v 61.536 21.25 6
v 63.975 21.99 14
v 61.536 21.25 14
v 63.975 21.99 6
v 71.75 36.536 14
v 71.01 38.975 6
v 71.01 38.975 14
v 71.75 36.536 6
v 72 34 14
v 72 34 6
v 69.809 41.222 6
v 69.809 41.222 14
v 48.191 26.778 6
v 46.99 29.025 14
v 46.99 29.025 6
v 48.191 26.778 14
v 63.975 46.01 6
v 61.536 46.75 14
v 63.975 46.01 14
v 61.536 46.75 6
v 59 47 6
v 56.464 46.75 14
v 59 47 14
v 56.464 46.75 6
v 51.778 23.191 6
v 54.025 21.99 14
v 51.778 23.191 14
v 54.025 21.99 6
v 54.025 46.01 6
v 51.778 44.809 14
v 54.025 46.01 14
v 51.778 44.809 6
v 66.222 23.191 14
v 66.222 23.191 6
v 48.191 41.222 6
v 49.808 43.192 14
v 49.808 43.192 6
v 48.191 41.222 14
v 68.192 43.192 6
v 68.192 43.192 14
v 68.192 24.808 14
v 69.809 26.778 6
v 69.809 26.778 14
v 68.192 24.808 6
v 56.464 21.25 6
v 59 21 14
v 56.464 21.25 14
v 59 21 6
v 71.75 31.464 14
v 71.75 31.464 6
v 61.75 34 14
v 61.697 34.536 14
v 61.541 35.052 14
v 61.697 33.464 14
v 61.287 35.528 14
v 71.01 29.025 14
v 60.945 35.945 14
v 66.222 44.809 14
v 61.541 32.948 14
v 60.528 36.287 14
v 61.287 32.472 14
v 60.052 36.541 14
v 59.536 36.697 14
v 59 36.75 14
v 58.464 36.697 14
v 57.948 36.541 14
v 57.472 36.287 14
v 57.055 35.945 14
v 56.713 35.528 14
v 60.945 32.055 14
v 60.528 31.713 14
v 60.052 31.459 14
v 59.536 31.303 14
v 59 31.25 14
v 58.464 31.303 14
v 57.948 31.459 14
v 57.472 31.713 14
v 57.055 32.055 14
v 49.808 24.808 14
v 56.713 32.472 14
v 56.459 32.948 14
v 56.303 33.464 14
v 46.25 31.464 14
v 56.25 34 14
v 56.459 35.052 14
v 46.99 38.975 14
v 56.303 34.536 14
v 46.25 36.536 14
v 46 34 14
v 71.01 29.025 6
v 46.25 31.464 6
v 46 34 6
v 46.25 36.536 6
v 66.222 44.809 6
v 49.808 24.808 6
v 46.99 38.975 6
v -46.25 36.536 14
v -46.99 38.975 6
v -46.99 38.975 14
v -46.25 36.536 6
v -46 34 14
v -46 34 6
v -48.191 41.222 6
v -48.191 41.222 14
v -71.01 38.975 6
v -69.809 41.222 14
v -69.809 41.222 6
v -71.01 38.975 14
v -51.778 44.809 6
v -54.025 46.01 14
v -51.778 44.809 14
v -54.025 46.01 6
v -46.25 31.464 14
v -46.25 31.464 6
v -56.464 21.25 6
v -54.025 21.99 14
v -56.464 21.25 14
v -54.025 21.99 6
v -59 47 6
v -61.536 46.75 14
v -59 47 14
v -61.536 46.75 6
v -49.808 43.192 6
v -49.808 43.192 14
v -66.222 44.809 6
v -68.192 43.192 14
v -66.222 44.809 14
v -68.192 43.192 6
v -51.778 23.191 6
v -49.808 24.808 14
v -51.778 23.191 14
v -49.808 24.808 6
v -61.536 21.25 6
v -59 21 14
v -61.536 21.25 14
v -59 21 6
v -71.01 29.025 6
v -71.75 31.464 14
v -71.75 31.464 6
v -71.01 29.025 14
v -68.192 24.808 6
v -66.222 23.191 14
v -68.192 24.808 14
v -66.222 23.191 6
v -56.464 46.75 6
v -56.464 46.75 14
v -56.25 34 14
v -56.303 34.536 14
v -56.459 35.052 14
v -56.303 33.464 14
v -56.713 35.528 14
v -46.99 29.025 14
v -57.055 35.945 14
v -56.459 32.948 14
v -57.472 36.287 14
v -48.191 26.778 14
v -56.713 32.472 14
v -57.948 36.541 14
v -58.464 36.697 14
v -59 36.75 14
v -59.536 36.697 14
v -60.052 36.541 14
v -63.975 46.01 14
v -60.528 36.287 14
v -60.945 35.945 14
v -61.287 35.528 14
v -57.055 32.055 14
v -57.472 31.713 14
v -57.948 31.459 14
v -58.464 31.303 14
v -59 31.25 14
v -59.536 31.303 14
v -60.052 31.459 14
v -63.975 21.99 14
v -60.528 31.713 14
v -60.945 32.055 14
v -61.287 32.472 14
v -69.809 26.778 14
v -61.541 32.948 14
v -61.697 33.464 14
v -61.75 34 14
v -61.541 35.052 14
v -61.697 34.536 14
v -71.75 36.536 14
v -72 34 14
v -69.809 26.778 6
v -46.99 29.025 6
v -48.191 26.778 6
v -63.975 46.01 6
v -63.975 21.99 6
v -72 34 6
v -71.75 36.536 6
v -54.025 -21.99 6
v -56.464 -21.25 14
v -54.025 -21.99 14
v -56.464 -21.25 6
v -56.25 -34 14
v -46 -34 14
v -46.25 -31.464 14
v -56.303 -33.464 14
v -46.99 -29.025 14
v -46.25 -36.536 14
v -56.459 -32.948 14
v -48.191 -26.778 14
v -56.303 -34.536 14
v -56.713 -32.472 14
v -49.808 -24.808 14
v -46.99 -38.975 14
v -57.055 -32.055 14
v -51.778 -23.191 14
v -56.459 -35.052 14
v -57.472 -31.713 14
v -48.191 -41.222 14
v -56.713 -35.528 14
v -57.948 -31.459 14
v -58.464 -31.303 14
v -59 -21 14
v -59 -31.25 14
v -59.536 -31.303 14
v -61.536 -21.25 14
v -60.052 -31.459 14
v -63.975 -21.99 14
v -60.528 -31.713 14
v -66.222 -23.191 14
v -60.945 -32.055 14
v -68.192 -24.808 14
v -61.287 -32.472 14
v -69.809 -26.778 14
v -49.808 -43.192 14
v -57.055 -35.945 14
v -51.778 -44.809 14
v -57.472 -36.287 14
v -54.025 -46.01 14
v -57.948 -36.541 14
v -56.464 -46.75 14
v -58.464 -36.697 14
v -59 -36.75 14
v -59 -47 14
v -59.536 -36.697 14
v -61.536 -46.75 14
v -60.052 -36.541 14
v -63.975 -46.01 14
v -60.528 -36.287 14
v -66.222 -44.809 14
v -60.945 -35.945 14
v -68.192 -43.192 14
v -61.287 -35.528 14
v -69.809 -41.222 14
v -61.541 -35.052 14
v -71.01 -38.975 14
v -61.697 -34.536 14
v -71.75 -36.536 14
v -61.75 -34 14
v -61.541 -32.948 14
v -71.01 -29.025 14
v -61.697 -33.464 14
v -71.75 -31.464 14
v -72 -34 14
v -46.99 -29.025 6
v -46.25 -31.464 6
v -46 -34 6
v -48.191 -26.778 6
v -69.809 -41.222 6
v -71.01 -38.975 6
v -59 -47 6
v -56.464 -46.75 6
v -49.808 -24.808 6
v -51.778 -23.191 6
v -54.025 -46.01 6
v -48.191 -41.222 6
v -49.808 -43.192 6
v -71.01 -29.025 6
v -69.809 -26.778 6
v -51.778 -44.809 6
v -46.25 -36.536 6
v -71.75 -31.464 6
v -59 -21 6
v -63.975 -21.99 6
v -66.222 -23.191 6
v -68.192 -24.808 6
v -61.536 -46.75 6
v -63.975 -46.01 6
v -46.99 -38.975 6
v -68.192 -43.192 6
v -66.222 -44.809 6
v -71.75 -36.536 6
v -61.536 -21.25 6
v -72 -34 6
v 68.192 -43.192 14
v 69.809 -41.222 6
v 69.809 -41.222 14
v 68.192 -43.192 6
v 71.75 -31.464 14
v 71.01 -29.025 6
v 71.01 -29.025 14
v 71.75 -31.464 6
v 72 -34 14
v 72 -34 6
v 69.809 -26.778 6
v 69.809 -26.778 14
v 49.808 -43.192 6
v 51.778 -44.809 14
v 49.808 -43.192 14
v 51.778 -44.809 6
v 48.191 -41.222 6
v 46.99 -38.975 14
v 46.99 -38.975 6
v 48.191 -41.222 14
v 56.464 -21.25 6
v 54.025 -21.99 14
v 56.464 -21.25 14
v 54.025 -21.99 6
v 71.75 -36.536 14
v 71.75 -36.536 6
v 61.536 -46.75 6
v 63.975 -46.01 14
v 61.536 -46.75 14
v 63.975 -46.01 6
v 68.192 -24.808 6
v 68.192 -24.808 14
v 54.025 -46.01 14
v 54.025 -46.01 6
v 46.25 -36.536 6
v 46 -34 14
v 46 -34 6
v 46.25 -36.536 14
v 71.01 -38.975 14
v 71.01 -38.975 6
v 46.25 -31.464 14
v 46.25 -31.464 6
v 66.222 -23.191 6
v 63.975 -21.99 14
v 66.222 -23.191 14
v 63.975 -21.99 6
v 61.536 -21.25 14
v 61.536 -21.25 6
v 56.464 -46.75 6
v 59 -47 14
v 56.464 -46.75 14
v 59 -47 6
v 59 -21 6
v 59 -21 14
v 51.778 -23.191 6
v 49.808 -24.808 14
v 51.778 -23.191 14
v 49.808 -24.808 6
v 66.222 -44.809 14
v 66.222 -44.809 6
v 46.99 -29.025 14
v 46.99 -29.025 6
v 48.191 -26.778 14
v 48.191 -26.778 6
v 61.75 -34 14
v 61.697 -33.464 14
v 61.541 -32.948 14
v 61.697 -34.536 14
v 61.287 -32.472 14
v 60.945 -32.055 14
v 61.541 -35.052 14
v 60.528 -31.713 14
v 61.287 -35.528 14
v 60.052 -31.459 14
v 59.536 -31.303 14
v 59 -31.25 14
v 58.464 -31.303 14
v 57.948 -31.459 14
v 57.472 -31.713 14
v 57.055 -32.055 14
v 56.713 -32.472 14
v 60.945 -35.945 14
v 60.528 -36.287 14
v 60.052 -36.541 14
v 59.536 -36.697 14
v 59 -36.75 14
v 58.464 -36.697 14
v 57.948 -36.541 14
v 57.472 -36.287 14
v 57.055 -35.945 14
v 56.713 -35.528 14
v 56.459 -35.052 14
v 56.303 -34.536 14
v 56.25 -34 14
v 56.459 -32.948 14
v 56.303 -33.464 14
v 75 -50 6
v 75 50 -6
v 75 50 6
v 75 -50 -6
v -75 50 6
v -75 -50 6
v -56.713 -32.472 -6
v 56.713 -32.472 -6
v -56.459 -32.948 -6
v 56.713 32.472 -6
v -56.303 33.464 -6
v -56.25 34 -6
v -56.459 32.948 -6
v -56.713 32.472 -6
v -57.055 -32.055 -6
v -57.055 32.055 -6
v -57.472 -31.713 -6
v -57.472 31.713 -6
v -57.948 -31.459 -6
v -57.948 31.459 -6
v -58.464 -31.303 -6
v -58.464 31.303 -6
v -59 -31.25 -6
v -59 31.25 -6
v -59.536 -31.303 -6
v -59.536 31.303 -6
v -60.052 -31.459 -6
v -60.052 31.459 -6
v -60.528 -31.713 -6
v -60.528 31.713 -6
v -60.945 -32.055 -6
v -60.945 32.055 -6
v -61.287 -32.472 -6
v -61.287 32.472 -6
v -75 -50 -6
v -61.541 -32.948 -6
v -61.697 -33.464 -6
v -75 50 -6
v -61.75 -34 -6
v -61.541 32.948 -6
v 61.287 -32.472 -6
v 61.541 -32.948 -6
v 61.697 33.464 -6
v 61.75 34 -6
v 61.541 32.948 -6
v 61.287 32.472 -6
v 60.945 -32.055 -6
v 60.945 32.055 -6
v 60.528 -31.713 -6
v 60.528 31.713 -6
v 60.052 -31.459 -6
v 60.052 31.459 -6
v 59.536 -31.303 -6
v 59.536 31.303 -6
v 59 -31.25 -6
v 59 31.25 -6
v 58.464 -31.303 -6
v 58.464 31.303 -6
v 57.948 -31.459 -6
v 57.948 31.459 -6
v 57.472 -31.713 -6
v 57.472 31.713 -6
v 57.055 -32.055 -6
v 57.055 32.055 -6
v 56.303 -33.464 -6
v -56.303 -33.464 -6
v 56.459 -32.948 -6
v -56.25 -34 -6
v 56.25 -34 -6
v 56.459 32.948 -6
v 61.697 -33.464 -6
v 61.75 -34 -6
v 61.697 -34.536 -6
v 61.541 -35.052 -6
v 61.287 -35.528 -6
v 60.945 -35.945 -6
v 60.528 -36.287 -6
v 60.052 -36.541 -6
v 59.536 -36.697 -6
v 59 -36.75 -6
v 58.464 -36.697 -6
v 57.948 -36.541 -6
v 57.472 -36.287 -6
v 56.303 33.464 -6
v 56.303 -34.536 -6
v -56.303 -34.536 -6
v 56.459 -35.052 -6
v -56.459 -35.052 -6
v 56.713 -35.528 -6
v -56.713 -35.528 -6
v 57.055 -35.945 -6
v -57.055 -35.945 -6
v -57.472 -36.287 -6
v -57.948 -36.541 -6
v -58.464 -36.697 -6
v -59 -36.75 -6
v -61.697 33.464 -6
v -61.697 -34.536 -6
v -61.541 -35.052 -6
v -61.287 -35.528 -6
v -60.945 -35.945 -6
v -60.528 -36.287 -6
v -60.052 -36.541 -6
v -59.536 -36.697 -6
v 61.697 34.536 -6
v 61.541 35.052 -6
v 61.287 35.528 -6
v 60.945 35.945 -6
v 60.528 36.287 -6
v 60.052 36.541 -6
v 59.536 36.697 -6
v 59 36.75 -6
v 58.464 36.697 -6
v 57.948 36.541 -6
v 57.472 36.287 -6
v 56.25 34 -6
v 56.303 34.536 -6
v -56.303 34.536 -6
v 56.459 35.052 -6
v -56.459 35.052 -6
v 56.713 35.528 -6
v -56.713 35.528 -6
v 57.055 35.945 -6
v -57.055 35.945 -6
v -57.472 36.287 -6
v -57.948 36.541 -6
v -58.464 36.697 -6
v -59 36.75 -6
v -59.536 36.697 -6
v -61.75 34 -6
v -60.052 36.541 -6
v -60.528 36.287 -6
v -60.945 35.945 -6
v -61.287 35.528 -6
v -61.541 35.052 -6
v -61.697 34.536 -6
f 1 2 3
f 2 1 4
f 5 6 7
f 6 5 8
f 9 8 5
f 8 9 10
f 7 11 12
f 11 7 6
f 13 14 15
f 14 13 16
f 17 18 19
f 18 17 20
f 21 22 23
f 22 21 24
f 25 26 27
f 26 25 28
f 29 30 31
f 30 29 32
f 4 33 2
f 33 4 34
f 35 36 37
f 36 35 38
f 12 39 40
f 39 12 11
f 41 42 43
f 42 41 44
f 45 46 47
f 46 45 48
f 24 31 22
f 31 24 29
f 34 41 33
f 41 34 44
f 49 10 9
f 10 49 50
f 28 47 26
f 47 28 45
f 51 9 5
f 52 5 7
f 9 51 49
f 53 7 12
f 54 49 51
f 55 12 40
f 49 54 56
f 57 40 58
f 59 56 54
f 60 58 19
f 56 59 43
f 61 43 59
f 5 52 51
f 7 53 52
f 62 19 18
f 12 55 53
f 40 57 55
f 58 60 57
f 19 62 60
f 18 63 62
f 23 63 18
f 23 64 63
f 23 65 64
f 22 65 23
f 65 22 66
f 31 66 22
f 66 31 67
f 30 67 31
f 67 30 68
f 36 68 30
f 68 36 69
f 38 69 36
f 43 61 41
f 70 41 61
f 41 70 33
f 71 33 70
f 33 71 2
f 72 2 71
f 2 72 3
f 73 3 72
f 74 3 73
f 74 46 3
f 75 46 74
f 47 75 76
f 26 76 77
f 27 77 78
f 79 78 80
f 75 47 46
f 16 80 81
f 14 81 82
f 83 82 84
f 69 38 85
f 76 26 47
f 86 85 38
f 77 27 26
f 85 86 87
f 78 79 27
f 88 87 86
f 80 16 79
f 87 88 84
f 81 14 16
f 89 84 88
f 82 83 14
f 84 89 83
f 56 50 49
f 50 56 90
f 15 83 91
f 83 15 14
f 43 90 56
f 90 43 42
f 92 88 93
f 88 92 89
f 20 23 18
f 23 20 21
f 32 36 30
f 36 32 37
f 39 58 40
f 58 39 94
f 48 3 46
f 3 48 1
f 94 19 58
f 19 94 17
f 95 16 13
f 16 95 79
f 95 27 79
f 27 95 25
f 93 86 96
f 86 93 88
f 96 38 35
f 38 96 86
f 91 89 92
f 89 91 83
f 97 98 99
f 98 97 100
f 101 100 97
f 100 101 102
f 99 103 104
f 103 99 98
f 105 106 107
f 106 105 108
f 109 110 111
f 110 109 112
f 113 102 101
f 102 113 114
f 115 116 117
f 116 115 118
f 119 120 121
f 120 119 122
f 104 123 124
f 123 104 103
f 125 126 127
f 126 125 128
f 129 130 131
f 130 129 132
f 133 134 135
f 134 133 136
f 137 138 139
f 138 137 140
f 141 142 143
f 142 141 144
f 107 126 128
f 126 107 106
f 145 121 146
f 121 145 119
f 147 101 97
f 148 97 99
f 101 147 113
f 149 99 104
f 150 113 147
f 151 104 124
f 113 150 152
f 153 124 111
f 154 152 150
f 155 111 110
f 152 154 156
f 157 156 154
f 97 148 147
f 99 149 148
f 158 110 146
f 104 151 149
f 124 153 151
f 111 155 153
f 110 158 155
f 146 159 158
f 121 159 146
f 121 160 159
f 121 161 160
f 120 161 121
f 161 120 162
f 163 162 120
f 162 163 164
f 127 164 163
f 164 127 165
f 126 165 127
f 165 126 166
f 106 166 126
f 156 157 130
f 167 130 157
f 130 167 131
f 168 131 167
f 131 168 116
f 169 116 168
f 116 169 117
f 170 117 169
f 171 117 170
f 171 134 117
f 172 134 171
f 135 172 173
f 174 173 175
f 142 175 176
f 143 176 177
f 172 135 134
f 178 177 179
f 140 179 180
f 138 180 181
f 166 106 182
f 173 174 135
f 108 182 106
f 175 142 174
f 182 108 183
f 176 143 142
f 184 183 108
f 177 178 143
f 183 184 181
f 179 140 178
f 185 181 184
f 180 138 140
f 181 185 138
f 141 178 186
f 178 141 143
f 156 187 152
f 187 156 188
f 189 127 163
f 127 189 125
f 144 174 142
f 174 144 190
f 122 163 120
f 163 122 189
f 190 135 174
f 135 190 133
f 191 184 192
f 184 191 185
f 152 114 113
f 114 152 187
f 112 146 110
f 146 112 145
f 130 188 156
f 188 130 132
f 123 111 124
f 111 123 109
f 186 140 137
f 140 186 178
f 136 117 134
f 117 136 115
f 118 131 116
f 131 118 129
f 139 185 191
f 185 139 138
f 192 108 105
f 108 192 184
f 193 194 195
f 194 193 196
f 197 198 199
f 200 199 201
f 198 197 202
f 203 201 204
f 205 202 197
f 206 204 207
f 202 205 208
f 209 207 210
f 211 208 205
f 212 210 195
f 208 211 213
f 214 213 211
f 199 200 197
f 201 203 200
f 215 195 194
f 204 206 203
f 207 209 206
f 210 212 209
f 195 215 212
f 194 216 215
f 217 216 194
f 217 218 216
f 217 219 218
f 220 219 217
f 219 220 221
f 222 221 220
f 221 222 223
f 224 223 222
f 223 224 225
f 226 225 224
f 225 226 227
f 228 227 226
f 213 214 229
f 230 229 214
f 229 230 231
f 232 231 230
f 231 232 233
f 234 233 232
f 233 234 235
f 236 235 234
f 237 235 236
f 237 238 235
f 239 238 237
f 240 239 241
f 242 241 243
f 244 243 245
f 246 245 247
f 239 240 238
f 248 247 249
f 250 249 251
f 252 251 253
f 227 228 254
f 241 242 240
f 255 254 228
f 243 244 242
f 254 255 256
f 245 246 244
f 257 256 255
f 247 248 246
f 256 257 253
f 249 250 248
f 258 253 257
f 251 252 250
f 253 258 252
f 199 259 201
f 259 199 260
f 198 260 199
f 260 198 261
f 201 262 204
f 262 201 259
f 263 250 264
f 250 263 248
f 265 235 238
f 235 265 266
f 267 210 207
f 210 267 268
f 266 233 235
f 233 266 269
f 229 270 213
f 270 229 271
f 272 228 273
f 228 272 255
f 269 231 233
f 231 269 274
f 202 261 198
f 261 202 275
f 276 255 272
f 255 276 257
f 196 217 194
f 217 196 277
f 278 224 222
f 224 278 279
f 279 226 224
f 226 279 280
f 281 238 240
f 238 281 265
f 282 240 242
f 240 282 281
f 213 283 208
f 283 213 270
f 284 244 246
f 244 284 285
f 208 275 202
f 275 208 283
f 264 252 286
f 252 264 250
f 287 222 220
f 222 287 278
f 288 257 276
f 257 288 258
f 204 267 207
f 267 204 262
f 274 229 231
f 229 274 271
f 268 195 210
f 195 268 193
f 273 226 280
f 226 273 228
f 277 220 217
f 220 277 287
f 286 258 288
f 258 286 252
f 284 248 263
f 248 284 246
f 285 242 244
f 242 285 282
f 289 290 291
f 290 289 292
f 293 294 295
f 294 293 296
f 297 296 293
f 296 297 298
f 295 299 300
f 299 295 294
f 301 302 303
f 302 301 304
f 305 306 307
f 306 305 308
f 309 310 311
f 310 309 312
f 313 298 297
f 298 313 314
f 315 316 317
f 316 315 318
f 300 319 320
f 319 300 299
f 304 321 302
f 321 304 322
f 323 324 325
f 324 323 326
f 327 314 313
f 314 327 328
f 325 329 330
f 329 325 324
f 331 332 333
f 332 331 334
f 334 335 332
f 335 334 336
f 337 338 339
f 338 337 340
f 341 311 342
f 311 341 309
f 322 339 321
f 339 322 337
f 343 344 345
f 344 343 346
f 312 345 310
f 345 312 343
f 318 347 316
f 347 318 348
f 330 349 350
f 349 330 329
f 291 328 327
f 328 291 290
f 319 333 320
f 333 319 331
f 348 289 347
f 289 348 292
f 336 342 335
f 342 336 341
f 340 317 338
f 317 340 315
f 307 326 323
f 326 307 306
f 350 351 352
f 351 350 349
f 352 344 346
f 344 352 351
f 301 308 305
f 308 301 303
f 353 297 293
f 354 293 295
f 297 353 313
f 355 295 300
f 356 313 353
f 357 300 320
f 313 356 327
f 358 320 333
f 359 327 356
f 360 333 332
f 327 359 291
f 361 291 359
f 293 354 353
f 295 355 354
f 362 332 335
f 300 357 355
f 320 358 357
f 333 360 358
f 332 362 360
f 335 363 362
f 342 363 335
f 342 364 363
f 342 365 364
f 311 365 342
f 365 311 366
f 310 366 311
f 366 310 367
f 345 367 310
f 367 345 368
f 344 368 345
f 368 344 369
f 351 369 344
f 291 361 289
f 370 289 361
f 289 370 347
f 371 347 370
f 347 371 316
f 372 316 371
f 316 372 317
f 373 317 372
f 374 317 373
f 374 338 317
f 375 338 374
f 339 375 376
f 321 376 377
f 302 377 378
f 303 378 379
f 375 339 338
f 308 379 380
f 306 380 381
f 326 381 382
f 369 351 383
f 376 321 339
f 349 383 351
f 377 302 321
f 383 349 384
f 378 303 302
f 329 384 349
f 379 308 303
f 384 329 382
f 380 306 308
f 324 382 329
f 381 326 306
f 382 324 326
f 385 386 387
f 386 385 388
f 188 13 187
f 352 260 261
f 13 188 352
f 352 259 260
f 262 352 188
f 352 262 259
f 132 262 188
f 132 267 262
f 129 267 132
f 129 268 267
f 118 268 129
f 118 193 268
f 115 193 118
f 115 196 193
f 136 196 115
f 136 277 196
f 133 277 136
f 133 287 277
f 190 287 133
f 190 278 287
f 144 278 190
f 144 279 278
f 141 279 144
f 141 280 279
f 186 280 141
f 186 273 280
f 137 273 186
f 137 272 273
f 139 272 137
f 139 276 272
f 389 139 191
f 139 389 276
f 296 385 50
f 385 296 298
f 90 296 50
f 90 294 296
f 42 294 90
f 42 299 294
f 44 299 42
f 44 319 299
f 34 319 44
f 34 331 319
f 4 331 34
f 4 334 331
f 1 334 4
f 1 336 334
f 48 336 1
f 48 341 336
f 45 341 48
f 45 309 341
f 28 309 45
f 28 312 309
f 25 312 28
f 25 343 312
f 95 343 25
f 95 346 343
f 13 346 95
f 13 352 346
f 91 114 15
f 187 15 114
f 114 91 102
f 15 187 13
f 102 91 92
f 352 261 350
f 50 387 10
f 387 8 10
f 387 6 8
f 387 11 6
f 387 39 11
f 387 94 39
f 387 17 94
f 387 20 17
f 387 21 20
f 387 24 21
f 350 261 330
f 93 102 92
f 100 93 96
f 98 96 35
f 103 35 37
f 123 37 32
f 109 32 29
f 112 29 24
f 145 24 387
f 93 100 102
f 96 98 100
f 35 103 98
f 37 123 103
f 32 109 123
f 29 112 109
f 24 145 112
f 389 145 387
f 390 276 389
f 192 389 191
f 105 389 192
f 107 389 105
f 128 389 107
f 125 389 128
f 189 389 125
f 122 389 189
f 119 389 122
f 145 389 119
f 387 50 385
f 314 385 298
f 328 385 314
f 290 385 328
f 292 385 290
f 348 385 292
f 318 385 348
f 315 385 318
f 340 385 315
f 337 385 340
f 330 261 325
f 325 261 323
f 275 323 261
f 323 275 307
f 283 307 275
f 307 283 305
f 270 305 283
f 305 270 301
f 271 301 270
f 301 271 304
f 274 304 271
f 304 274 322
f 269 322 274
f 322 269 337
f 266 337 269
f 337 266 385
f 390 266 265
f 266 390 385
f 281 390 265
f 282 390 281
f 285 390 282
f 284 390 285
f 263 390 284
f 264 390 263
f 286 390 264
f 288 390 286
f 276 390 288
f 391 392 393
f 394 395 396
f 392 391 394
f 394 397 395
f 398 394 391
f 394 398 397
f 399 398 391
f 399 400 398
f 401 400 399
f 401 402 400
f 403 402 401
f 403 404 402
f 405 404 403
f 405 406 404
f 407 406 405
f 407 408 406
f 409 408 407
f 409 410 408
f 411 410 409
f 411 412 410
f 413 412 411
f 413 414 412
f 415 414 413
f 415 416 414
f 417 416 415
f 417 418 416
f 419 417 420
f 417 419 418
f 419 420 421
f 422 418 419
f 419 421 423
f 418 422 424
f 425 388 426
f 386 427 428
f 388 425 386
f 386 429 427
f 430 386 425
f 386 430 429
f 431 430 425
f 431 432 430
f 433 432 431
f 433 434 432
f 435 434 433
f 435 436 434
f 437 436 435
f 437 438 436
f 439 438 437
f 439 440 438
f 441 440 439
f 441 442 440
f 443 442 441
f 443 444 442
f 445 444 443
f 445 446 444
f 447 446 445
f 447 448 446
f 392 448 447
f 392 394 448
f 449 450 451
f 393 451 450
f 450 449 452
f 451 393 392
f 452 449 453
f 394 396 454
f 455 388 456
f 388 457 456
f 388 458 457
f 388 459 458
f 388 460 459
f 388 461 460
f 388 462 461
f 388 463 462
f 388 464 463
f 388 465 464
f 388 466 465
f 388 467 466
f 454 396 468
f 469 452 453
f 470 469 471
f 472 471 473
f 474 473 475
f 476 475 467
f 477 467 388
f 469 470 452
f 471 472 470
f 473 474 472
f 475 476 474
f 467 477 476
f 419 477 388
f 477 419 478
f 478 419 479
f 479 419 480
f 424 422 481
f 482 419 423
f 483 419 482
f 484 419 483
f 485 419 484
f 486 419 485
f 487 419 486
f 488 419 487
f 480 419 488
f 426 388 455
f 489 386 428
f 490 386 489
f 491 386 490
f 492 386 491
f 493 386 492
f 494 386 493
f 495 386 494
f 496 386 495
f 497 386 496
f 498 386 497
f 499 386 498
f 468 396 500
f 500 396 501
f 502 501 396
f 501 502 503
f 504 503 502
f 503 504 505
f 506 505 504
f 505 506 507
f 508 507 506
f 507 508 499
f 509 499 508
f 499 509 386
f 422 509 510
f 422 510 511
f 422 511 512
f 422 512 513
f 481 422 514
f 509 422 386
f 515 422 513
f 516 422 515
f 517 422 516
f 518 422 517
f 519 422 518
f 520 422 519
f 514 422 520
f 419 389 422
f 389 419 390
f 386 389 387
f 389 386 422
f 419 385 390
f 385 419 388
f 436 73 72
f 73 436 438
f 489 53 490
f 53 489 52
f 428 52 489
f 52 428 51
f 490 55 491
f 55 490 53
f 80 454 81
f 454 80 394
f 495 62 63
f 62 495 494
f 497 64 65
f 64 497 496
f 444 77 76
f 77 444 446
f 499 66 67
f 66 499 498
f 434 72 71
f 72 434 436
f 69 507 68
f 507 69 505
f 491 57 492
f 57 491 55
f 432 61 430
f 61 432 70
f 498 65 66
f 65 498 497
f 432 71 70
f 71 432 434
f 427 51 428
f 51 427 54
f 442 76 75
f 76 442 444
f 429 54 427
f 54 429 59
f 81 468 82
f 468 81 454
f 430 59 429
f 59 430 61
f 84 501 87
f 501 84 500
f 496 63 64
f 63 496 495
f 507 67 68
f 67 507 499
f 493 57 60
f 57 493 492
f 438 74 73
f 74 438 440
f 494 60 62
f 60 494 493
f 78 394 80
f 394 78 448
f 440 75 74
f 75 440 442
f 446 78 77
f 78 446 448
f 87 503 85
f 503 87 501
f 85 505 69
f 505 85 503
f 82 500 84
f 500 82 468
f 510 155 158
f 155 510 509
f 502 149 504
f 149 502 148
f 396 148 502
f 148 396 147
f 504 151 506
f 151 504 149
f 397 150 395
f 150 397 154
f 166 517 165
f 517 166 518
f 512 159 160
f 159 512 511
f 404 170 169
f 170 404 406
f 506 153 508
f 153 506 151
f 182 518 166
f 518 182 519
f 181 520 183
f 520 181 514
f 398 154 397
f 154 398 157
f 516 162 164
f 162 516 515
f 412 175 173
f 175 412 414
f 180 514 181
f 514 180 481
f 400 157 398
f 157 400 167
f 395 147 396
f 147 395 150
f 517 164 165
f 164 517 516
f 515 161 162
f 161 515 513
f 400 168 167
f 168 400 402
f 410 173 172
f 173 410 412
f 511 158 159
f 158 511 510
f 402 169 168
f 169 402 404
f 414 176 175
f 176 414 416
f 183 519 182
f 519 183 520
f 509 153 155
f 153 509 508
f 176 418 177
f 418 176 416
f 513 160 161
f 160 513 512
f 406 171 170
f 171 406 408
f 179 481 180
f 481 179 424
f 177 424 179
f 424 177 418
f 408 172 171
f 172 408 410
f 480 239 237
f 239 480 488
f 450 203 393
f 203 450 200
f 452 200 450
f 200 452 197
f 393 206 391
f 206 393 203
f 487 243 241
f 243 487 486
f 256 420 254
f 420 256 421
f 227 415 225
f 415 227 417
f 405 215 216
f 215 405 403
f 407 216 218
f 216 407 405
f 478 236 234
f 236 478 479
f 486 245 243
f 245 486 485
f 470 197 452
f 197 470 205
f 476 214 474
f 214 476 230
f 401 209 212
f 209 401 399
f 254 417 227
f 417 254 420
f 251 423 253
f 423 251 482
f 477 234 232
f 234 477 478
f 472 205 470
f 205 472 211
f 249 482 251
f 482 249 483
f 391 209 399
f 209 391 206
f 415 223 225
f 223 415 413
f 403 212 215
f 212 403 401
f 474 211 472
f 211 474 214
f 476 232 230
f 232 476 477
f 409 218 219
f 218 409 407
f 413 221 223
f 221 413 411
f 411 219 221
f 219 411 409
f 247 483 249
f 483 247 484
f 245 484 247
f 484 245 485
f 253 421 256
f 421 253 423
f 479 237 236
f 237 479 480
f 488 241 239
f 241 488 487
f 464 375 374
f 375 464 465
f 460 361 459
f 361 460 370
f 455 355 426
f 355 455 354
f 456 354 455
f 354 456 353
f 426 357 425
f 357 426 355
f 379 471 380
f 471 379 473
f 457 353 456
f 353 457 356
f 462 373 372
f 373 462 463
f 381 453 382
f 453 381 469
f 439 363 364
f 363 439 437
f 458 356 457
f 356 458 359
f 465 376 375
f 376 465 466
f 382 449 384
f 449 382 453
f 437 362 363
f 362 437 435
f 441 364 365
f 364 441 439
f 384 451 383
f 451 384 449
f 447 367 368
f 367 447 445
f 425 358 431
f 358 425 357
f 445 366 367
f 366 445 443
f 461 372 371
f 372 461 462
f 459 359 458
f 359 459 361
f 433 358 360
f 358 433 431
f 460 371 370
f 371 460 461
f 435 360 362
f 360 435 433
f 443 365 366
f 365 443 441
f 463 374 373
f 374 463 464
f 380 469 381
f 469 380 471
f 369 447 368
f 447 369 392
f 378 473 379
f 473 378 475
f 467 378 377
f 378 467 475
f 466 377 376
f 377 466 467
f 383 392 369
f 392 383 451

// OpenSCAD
$fn = 32;

// ----------------------------------------------------------------------
// Anchor pads 150 x 100 x 20
// four corner bosses with anchor holes
// ----------------------------------------------------------------------

// --- parameters (mm) ---
plate = [150, 100, 12];  // base plate size (x, y, z)
pads = 4;                // boss count, one per corner
edge = 16;               // boss centre offset from the plate edge
boss_d = 26;             // boss diameter
boss_h = 8;              // boss height above the base plate
hole_d = 5.5;            // hole diameter

// --- derived feature positions (mm) ---
height = plate[2] + boss_h;      // = 20   overall height of the part
corner_x = plate[0] / 2 - edge;  // = 59   boss centre X
corner_y = plate[1] / 2 - edge;  // = 34   boss centre Y
feature_centers = [
  [corner_x, corner_y],
  [-corner_x, corner_y],
  [-corner_x, -corner_y],
  [corner_x, -corner_y]
];   // boss centres, anchor holes are drilled there

// base plate, four bosses standing on it, anchor holes all the way through
difference() {
  union() {
    cube(plate, center = true);
    for (centre = feature_centers)
      translate([centre[0], centre[1], plate[2] / 2 - 1])
        cylinder(d = boss_d, h = boss_h + 1);
  }
  for (centre = feature_centers)
    translate([centre[0], centre[1], -height])
      cylinder(d = hole_d, h = 2 * height + 2);  // through boss and plate
}
